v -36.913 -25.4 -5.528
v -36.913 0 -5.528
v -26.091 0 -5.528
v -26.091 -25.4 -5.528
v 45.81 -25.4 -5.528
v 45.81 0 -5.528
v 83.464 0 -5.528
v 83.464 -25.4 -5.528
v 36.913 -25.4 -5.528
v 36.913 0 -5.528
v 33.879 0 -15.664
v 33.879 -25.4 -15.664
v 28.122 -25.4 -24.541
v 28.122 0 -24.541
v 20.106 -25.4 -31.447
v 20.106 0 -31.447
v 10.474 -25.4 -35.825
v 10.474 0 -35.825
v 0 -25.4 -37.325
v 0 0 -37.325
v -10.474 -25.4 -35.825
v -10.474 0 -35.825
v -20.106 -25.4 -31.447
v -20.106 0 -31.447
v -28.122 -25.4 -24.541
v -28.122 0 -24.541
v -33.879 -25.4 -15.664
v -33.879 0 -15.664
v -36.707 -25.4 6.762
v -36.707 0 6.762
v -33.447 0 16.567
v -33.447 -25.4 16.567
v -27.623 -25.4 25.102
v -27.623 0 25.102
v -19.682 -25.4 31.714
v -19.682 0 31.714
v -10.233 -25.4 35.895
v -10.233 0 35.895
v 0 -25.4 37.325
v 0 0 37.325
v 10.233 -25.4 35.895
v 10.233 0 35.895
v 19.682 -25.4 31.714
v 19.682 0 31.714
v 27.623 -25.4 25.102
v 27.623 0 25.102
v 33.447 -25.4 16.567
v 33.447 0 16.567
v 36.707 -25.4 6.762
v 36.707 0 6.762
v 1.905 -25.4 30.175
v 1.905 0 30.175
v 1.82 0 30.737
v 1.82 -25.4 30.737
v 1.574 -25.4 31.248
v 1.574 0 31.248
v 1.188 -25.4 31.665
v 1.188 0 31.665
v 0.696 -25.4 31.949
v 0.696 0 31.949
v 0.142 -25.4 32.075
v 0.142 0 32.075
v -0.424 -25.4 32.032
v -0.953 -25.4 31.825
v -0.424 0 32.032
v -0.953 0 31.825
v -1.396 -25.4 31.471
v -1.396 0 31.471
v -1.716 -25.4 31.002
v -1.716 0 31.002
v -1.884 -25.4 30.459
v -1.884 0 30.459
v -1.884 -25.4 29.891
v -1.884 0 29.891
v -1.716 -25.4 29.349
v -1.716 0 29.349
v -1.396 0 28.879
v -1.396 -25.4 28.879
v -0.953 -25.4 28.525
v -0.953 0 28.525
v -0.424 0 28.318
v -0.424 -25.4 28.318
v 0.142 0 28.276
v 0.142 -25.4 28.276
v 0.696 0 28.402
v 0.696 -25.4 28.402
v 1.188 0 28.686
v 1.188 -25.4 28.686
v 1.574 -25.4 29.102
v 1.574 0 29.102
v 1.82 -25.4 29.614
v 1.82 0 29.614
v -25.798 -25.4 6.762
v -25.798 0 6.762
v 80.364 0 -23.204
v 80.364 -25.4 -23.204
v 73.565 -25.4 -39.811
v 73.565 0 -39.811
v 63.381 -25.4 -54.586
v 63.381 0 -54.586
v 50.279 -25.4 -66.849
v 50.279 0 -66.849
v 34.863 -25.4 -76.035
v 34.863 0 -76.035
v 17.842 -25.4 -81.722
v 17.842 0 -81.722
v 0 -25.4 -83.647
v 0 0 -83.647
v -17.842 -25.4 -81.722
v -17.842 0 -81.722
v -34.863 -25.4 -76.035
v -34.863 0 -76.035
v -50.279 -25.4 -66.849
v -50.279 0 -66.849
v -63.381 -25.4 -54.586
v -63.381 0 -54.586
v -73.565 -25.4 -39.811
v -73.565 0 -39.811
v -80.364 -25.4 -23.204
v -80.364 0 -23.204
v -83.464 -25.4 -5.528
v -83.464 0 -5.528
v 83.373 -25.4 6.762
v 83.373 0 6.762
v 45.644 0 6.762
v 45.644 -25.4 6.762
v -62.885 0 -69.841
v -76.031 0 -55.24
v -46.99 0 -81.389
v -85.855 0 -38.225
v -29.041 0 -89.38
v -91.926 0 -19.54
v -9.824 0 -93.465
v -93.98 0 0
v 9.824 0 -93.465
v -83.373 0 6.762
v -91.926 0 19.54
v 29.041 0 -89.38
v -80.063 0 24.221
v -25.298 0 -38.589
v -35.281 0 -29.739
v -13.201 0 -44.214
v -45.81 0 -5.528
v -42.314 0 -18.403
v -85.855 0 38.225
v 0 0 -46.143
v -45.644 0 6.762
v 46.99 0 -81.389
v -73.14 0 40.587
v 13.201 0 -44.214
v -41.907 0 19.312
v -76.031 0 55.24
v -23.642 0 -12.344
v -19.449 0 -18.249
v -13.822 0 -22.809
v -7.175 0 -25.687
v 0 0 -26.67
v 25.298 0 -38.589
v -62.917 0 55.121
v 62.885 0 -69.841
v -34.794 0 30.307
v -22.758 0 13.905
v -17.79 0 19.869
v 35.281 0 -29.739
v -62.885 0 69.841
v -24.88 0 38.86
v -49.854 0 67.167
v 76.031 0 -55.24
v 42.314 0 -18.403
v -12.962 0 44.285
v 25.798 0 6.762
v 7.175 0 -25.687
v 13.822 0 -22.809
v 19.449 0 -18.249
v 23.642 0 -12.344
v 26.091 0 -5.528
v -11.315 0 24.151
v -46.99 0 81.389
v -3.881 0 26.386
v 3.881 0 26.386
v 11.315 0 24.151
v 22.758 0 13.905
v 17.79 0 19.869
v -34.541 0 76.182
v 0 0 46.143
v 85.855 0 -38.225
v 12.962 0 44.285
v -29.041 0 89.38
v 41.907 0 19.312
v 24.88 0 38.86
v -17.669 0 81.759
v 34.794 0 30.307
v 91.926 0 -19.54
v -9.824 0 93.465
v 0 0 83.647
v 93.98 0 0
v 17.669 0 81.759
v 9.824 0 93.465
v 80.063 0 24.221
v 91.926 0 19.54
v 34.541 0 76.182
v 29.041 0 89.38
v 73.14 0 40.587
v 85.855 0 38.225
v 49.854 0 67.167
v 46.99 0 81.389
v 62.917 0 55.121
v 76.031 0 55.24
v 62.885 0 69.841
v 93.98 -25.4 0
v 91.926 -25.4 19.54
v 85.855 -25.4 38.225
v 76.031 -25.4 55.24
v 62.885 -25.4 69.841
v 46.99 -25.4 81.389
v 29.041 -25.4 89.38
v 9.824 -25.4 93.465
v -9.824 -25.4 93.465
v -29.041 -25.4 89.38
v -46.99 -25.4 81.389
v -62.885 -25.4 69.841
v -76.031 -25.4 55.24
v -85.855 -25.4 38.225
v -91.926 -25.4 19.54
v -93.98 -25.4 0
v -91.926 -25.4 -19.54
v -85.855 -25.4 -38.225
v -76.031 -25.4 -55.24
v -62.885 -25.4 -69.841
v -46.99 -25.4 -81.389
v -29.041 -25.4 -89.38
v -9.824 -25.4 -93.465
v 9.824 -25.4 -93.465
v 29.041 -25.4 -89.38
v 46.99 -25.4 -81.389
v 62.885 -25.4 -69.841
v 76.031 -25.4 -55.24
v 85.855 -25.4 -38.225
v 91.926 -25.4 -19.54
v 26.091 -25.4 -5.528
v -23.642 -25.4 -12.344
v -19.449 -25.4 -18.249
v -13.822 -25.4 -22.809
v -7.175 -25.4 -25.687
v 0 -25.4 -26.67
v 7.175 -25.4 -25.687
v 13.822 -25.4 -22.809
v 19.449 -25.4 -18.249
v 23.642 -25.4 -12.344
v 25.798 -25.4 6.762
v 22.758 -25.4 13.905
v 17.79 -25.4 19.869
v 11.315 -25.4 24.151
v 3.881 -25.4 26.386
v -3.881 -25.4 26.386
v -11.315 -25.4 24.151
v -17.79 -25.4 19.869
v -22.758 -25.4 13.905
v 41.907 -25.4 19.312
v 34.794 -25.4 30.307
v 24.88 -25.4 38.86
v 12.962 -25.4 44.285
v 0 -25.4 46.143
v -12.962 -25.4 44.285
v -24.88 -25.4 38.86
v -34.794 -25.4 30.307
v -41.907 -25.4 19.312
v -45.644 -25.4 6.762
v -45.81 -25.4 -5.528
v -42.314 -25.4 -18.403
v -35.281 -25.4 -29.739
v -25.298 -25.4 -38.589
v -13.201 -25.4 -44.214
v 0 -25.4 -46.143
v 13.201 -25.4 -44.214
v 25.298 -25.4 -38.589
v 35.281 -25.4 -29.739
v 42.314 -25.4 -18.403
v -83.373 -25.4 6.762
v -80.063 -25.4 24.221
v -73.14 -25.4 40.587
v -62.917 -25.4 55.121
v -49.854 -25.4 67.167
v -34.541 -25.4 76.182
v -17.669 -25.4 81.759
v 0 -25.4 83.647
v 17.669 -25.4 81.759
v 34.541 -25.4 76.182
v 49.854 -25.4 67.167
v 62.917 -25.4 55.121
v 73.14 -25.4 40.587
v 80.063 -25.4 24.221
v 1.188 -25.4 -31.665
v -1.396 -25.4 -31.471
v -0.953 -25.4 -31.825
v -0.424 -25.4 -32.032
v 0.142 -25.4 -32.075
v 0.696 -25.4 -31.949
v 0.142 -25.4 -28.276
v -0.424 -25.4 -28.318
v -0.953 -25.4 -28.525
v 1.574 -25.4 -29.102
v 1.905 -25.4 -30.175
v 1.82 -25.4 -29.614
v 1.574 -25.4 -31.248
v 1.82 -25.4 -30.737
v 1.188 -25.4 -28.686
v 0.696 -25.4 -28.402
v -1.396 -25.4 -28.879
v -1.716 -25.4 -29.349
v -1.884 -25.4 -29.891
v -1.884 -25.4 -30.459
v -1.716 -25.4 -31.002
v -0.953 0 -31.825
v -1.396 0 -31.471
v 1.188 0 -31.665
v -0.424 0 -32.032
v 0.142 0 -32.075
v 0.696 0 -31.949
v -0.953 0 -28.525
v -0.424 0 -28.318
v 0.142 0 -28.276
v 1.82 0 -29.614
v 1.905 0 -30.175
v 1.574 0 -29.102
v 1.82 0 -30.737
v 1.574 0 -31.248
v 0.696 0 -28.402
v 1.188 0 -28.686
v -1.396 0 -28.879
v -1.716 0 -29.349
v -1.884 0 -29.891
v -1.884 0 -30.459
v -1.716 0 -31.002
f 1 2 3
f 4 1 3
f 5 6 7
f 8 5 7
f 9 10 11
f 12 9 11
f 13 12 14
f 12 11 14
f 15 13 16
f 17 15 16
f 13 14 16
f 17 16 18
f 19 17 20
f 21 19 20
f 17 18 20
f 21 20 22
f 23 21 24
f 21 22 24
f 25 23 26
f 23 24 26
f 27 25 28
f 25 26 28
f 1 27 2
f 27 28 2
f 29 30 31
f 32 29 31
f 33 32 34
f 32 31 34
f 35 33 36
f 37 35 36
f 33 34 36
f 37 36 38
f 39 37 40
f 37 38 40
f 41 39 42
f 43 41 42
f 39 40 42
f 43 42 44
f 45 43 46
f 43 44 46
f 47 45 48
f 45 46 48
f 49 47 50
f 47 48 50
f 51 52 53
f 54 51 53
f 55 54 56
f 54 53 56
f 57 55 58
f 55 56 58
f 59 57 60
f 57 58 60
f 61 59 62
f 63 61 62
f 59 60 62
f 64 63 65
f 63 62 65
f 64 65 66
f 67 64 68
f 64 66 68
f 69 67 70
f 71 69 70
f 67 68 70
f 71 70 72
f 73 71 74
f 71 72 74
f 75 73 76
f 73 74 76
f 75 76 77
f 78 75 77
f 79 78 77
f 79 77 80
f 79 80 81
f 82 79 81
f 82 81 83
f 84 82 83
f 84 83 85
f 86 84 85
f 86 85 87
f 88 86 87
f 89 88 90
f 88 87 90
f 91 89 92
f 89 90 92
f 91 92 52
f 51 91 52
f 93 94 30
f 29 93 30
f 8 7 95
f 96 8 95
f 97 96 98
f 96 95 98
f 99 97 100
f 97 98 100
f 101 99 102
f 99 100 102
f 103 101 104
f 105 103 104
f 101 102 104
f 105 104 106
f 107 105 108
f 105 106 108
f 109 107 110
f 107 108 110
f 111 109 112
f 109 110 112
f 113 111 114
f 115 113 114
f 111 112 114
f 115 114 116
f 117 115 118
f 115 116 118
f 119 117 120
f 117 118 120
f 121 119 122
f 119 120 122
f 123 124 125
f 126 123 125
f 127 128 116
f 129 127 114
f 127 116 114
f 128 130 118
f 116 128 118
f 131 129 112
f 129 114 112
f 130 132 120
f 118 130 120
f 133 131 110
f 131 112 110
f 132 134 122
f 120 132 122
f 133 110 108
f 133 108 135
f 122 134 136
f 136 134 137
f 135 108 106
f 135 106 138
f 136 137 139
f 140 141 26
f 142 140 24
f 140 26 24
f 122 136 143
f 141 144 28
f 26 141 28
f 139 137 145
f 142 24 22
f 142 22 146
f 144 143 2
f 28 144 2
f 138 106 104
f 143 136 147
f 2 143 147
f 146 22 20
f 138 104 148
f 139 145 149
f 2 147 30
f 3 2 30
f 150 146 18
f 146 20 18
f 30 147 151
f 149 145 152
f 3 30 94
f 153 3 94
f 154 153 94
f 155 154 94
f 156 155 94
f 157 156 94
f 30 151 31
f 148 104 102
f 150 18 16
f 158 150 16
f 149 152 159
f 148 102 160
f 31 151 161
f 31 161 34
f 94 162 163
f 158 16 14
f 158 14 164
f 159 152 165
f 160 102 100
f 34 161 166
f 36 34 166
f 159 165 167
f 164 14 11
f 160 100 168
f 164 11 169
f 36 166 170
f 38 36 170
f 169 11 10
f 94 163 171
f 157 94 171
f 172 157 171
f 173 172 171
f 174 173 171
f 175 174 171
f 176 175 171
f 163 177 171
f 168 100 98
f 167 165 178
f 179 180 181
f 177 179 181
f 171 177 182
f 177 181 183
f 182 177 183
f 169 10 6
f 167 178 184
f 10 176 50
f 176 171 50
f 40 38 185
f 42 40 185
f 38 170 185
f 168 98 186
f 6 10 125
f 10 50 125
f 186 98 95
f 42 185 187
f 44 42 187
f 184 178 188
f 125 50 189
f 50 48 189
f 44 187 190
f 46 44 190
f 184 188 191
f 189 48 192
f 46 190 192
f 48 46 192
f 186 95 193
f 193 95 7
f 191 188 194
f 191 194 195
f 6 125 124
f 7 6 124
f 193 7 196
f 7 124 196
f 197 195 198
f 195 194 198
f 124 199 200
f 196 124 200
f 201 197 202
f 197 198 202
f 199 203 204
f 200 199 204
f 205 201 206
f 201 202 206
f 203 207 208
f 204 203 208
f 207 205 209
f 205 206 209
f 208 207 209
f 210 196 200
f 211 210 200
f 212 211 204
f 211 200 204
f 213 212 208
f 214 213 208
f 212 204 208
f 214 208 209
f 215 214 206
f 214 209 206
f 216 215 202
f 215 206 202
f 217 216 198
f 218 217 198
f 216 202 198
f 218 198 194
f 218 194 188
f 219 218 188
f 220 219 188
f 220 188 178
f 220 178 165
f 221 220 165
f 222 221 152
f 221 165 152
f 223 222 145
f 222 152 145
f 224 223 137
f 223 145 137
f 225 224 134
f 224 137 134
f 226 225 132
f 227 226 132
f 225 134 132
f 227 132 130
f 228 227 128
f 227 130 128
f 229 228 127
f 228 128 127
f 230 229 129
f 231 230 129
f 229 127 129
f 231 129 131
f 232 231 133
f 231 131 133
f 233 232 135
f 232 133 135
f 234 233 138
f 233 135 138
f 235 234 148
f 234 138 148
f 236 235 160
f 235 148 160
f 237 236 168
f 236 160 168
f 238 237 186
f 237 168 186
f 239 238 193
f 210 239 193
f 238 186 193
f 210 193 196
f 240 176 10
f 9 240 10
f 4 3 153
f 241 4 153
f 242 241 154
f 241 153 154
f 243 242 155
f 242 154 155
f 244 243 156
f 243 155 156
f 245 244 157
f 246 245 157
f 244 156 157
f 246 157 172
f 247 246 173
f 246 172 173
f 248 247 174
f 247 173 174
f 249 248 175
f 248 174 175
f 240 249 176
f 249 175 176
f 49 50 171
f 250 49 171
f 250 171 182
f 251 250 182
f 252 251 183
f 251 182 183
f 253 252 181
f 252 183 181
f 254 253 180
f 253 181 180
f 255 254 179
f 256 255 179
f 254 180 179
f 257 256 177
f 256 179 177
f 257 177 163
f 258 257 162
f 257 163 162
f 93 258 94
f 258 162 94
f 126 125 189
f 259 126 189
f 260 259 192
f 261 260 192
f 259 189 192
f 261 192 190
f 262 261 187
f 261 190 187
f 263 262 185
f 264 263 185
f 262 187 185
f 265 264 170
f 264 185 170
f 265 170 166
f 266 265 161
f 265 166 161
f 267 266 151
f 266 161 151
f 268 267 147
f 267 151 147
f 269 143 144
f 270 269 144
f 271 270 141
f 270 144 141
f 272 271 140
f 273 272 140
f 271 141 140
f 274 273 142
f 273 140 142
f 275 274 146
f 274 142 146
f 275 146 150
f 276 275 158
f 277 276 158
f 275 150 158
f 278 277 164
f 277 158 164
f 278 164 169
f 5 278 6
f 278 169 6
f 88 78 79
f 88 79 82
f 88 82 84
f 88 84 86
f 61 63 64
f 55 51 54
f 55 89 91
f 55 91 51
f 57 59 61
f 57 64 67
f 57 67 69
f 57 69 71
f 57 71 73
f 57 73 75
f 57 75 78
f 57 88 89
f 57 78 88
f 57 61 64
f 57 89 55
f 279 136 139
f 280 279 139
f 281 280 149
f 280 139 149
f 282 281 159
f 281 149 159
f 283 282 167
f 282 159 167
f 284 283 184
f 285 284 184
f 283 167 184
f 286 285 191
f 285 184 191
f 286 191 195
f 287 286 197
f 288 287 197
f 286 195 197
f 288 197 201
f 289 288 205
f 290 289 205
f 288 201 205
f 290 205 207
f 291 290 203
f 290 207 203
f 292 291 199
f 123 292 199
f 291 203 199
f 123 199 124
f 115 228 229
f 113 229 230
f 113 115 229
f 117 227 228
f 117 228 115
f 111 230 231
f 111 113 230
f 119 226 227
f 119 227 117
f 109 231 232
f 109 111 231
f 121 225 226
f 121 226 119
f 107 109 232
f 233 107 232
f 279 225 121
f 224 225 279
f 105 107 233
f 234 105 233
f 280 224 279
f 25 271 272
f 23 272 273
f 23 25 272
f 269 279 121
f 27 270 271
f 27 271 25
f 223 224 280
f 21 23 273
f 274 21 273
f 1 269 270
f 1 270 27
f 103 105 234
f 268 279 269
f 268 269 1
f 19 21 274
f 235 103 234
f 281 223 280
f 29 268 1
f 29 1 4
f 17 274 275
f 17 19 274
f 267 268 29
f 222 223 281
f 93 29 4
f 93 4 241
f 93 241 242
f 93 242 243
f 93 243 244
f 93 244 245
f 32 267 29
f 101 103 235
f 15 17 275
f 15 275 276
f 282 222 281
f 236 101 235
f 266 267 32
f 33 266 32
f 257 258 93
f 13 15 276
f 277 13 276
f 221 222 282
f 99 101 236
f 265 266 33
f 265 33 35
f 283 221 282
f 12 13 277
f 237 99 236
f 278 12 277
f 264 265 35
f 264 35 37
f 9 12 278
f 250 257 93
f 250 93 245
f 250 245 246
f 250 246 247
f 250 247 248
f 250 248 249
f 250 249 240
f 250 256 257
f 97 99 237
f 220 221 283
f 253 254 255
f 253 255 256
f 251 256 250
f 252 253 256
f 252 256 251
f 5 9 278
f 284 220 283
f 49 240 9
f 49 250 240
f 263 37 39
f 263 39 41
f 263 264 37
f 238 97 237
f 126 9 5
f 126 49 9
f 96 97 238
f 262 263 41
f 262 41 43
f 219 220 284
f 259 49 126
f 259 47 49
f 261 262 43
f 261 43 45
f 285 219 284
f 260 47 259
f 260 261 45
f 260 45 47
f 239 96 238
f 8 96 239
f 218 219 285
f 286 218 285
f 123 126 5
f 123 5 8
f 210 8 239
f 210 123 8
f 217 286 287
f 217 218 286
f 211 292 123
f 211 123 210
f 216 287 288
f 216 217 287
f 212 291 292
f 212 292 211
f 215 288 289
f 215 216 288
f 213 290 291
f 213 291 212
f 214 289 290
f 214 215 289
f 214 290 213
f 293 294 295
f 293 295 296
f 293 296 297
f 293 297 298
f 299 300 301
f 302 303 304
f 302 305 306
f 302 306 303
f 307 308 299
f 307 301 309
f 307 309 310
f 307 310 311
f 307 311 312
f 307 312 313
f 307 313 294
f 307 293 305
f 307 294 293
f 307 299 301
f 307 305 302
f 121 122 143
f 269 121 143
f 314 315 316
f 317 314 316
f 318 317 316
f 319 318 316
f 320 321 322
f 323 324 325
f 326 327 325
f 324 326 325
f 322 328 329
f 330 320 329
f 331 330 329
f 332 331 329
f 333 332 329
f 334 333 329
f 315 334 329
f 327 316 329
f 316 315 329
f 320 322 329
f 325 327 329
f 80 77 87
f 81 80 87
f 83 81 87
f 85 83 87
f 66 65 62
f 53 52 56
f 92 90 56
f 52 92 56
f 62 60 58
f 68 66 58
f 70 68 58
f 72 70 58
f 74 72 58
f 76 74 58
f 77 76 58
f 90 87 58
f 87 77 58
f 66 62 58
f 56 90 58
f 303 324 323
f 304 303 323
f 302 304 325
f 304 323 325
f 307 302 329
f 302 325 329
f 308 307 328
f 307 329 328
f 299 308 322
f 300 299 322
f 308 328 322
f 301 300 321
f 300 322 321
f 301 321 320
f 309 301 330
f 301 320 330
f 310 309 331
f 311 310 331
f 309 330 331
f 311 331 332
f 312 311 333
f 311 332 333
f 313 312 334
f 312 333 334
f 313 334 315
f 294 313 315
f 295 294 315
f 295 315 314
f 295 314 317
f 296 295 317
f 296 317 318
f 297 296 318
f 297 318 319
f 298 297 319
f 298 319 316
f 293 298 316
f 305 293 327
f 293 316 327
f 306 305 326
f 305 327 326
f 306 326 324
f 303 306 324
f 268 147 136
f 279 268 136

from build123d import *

# Parameters (mm, degrees)
F0_R     = 93.98
F0_W     = 9.525
F0_H     = 25.4
F1_DEPTH = 25.4
F0_R_2   = 1.905


# Not quite as in the source:
# - a feature of the source that left no trace in its solid (it failed there, or was rolled back) is left out


with BuildPart() as f1:
    # F0 (on Front) → F1 (new body)
    with BuildSketch(Plane.XZ):
        Circle(F0_R)
        with BuildLine():
            ThreePointArc((-45.8102837042, -5.5278504869), (0, -46.1425966333), (45.8102837042, -5.5278504869))
            Line((45.8102837042, -5.5278504869), (83.4638586571, -5.5278504869))
            ThreePointArc((83.4638586571, -5.5278504869), (0, -83.646714418), (-83.4638586571, -5.5278504869))
            Line((-83.4638586571, -5.5278504869), (-45.8102837042, -5.5278504869))
        make_face(mode=Mode.SUBTRACT)
        with BuildLine():
            ThreePointArc((36.9132450635, -5.5278504869), (0, -37.3248548841), (-36.9132450635, -5.5278504869))
            Line((-36.9132450635, -5.5278504869), (-26.090836878, -5.5278504869))
            ThreePointArc((-26.090836878, -5.5278504869), (0, -26.67), (26.090836878, -5.5278504869))
            Line((26.090836878, -5.5278504869), (36.9132450635, -5.5278504869))
        make_face(mode=Mode.SUBTRACT)
        Rectangle(F0_W, F0_H, mode=Mode.SUBTRACT)
        with BuildLine():
            ThreePointArc((-36.7071338058, 6.7624788271), (0, 37.3248548841), (36.7071338058, 6.7624788271))
            Line((36.7071338058, 6.7624788271), (25.7984065421, 6.7624788271))
            ThreePointArc((25.7984065421, 6.7624788271), (0, 26.67), (-25.7984065421, 6.7624788271))
            Line((-25.7984065421, 6.7624788271), (-36.7071338058, 6.7624788271))
        make_face(mode=Mode.SUBTRACT)
        with BuildLine():
            Line((83.3729075482, 6.7624788271), (45.644365525, 6.7624788271))
            ThreePointArc((45.644365525, 6.7624788271), (0, 46.1425966333), (-45.644365525, 6.7624788271))
            Line((-45.644365525, 6.7624788271), (-83.3729075482, 6.7624788271))
            ThreePointArc((-83.3729075482, 6.7624788271), (0, 83.646714418), (83.3729075482, 6.7624788271))
        make_face(mode=Mode.SUBTRACT)
        Rectangle(F0_W, F0_H)
    extrude(amount=F1_DEPTH)


with BuildPart() as f1b:
    # F0 (on Front) → F1, piece 2 (new body)
    with BuildSketch(Plane.XZ):
        with Locations((0, 30.1752)):
            Circle(F0_R_2)
    extrude(amount=F1_DEPTH)


with BuildPart() as f1c:
    # F0 (on Front) → F1, piece 3 (new body)
    with BuildSketch(Plane.XZ):
        with Locations((0, -30.1752)):
            Circle(F0_R_2)
    extrude(amount=F1_DEPTH)


solid = Compound([f1.part, f1b.part, f1c.part])
